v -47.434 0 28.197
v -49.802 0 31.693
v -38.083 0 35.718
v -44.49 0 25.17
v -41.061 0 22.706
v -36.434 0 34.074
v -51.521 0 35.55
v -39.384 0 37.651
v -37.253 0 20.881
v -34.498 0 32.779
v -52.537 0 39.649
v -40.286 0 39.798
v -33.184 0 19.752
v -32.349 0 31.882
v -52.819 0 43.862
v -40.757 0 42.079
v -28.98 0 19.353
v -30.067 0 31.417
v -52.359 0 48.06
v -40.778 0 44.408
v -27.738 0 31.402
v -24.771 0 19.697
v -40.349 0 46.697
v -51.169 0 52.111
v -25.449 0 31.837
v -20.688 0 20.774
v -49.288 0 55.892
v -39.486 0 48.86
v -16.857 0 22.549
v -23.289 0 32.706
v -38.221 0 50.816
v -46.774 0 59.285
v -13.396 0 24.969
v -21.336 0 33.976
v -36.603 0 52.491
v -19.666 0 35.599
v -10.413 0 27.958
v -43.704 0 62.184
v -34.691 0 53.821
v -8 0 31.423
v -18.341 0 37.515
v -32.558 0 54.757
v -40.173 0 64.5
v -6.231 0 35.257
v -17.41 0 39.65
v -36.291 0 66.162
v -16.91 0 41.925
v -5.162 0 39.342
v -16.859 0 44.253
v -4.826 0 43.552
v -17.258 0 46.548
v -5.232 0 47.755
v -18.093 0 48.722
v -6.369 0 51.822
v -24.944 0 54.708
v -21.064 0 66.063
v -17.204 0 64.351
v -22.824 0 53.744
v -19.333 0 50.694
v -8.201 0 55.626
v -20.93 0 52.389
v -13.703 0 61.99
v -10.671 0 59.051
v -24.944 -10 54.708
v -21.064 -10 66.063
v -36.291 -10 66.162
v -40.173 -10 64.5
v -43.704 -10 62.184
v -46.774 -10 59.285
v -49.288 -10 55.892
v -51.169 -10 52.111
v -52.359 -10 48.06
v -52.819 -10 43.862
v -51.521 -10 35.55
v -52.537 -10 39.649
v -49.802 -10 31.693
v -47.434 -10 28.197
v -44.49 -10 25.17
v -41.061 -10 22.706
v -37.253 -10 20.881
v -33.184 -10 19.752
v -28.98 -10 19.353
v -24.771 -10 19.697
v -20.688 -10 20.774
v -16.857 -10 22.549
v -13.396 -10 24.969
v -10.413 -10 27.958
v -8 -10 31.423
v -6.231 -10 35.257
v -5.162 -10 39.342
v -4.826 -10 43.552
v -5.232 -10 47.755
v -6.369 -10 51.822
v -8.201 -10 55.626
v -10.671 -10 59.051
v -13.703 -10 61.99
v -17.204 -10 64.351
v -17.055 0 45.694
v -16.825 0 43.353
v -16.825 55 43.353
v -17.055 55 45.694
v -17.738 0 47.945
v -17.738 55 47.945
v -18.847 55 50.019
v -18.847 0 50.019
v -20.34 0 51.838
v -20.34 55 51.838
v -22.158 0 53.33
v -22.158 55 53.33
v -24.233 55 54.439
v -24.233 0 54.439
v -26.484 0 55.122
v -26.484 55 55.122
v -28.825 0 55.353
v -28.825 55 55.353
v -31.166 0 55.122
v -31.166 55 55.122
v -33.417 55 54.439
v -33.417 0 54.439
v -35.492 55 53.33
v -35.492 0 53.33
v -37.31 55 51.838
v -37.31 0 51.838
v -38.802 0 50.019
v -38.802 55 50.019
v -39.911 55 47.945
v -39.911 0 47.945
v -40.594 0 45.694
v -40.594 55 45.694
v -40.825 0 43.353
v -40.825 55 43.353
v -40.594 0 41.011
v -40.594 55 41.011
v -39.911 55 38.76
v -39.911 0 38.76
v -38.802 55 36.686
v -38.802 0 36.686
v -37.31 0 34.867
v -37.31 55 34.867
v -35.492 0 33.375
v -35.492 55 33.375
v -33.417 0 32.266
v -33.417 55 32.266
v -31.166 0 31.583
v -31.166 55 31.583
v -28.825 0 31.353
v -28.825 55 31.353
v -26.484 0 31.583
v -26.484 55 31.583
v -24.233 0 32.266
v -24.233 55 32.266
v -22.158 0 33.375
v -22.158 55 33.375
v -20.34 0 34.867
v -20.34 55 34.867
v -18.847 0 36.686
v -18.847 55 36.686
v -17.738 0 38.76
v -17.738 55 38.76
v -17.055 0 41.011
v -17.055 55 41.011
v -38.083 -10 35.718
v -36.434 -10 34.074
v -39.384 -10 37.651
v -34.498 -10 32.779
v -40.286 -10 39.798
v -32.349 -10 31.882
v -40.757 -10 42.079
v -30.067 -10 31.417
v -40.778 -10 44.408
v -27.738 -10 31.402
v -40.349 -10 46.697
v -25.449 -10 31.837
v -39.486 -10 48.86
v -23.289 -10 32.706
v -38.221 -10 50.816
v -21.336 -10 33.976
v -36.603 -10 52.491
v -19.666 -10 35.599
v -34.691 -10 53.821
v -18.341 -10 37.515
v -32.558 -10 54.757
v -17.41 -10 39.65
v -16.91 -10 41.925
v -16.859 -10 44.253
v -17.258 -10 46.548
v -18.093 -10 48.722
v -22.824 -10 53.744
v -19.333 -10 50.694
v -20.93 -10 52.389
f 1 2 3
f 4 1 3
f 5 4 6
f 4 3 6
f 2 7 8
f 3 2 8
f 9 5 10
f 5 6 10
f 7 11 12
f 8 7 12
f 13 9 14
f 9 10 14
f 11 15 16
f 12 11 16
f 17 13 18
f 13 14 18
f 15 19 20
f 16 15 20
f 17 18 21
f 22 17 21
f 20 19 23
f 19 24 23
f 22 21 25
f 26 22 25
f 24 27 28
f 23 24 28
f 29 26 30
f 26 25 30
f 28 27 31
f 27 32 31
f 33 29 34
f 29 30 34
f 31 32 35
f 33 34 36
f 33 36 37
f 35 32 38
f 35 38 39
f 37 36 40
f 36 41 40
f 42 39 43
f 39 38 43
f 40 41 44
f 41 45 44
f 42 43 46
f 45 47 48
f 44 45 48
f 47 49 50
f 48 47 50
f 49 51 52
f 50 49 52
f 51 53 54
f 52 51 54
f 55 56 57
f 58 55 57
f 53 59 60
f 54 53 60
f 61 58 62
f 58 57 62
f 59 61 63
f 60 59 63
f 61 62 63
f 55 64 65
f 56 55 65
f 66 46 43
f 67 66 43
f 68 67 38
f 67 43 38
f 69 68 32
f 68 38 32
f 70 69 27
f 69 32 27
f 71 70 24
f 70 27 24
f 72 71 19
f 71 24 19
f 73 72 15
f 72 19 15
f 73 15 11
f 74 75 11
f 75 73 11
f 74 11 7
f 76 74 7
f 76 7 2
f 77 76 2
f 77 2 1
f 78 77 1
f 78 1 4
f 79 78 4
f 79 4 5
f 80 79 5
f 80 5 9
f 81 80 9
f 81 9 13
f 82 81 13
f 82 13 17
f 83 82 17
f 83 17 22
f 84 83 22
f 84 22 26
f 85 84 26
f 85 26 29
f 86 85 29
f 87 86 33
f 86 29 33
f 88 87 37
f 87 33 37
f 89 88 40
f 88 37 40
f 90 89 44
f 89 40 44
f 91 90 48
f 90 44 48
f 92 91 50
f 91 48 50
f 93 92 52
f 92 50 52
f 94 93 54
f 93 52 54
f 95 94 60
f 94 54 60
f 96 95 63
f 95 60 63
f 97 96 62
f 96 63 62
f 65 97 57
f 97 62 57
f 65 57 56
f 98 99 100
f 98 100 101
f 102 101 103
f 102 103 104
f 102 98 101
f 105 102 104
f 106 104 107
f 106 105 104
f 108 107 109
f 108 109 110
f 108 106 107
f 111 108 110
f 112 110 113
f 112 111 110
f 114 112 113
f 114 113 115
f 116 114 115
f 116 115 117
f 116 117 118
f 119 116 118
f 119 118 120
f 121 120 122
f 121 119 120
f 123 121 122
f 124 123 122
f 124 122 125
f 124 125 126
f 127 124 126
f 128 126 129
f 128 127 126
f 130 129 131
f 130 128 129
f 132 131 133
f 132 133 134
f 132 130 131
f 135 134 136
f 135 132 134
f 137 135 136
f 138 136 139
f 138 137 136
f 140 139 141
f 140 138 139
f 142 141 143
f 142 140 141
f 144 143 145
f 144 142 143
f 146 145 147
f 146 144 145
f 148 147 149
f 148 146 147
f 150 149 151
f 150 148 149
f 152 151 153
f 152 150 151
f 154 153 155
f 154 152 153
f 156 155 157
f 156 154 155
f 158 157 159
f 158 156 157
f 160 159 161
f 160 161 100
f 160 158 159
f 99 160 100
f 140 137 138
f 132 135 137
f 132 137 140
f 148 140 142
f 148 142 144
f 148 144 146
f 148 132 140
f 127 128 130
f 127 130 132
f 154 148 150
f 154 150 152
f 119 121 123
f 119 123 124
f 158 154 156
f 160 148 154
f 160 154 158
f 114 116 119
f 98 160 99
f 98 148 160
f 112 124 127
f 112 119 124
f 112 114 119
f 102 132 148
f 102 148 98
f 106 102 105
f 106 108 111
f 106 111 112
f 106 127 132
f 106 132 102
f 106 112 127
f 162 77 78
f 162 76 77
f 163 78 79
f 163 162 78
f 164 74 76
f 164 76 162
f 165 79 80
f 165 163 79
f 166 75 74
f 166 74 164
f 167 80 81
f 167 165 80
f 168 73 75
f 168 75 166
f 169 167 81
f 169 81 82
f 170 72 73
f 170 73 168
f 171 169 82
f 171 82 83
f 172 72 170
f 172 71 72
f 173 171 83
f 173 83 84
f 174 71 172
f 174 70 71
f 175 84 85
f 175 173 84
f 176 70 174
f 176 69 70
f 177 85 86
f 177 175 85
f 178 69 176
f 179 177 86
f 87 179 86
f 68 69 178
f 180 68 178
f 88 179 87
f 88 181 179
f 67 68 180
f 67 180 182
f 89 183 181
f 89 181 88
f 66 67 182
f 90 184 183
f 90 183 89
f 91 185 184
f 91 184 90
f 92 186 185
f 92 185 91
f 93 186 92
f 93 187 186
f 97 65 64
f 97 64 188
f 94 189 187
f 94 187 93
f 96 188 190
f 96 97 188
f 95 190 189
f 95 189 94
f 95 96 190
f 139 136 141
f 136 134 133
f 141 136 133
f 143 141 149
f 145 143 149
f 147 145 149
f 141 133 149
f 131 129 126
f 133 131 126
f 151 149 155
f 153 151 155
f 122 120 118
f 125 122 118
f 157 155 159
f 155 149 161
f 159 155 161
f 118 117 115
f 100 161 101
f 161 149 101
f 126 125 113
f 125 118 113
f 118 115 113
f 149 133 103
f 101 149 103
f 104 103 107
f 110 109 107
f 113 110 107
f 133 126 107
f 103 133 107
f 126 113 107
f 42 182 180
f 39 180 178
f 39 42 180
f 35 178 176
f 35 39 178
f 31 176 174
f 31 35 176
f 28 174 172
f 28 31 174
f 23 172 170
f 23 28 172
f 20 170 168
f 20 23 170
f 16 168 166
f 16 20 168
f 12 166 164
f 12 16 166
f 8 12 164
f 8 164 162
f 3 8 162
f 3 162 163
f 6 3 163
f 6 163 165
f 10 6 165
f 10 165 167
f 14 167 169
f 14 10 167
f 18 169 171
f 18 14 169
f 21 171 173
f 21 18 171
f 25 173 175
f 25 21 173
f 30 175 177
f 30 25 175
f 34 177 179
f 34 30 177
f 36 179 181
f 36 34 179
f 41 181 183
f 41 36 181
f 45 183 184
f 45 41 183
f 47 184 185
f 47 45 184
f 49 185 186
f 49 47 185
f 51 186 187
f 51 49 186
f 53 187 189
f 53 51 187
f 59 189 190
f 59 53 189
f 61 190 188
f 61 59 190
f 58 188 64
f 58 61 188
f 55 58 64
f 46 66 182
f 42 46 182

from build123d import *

# Parameters (mm, degrees)
F0_R     = 12
F1_DEPTH = 55
F2_R     = 24
F2_R_2   = 12
F3_DEPTH = 10
F5_DEPTH = 25


with BuildPart() as f1:
    # F0 (on Front) → F1 (new body)
    with BuildSketch(Plane.XZ):
        with Locations((-28.8248471916, 43.3525703847)):
            Circle(F0_R)
    extrude(amount=-F1_DEPTH)


with BuildPart() as f3:
    # F2 (on face) → F3 (new body)
    with BuildSketch(Plane.XZ):
        with Locations((-28.8248471916, 43.3525703847)):
            Circle(F2_R)
        with Locations((-28.8248471916, 43.3525703847)):
            Circle(F2_R_2, mode=Mode.SUBTRACT)
    extrude(amount=F3_DEPTH)

    # F4 (on face) → F5 (cut)
    with BuildSketch(Plane.XZ.offset(10)):
        with BuildLine():
            Line((-36.2911306636, 66.1616609215), (-32.5579889276, 54.7571156531))
            ThreePointArc((-32.5579889276, 54.7571156531), (-28.7472060364, 55.3523192092), (-24.9444440878, 54.707854254))
            Line((-24.9444440878, 54.707854254), (-21.0640409839, 66.0631381233))
            ThreePointArc((-21.0640409839, 66.0631381233), (-28.6695648813, 67.3520680337), (-36.2911306636, 66.1616609215))
        make_face()
    extrude(amount=-F5_DEPTH, mode=Mode.SUBTRACT)


solid = Compound([f1.part, f3.part])
